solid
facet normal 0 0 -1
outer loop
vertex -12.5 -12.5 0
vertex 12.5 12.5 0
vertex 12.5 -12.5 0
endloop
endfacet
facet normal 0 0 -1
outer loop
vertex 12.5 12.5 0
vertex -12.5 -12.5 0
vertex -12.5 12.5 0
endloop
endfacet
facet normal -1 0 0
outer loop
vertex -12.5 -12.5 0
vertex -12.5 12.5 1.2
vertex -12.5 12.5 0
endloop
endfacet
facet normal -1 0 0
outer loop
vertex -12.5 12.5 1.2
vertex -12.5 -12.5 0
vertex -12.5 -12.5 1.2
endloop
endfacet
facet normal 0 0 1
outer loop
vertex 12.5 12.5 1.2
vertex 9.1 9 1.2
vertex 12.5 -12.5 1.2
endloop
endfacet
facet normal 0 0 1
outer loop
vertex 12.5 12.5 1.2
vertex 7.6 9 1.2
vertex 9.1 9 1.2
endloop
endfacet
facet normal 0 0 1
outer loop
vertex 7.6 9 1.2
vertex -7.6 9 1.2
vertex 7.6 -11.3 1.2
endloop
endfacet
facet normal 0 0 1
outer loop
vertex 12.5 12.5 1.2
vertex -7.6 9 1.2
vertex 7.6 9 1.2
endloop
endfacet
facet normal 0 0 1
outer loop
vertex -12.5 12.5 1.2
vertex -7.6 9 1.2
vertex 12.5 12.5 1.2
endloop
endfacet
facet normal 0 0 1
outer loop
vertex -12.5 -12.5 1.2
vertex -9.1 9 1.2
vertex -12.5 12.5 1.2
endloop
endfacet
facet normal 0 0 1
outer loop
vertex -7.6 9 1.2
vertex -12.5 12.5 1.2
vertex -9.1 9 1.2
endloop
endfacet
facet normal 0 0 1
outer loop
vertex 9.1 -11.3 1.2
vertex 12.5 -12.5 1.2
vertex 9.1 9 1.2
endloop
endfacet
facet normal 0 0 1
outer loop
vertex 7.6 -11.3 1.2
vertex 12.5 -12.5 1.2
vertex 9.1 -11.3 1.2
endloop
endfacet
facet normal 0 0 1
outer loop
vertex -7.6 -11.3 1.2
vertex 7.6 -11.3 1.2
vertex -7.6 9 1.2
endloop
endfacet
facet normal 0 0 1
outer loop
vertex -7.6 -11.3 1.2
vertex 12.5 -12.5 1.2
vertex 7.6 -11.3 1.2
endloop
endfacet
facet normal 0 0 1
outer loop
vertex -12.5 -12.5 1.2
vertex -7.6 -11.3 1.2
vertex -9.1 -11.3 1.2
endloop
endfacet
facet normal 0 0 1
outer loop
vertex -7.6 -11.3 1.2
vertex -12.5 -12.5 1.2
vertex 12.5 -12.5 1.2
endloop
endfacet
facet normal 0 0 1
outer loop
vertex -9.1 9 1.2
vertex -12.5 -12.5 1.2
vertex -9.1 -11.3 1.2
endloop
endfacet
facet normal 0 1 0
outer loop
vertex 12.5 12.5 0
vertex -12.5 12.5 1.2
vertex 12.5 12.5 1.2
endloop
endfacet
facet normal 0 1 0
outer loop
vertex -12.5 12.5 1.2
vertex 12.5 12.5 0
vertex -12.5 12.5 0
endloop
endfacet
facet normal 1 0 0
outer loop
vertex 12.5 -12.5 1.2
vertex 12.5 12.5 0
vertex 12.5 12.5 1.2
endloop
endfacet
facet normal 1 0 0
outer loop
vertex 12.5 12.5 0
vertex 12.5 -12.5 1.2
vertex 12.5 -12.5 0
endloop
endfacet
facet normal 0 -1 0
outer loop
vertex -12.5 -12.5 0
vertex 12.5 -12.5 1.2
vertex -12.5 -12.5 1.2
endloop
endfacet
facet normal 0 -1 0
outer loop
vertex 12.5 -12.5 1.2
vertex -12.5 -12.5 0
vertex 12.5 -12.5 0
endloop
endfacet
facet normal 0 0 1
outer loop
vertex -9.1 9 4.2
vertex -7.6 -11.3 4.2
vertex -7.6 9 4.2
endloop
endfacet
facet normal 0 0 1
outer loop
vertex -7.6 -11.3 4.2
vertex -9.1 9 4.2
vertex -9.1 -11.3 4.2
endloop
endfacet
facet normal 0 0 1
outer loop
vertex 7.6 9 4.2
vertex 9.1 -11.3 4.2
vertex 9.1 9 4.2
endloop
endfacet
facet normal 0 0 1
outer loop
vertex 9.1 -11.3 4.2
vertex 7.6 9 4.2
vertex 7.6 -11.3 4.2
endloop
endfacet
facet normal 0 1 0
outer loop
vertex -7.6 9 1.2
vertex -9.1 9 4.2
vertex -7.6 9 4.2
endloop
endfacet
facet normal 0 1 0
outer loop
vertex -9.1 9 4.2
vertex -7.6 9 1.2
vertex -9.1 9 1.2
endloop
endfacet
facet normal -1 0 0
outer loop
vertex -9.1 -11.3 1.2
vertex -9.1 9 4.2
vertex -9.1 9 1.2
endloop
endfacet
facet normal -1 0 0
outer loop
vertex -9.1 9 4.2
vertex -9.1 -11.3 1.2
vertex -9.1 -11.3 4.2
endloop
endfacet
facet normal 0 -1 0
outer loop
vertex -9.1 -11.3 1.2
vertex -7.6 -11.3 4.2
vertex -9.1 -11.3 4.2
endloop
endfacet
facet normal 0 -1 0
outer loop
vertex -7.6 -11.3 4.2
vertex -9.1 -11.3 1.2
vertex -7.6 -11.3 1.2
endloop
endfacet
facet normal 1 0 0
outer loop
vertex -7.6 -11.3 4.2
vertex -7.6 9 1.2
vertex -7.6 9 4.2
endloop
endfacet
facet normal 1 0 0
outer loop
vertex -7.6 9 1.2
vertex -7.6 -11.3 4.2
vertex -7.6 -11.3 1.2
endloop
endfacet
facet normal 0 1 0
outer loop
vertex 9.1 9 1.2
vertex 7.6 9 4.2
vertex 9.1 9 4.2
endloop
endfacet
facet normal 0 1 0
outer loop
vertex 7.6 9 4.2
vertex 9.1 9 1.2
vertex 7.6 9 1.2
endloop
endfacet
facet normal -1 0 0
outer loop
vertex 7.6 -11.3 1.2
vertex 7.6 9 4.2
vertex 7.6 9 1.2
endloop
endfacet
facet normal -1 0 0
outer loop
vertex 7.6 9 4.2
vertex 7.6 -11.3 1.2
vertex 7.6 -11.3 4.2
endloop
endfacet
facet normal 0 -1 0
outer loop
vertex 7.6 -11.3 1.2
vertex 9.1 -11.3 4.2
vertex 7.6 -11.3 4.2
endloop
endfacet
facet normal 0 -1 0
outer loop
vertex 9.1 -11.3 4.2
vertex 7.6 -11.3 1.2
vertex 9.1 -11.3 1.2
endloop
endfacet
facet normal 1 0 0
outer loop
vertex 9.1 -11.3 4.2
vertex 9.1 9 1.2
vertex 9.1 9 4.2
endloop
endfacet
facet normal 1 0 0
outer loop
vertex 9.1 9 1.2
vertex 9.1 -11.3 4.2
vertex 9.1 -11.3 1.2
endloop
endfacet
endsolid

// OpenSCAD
// ============================================================
// 모터 드라이버 쪽 면 - 평면도(XY, 정면에서 본 모습)
// 아래쪽 변이 ERM 면과 연결됨 (브라켓이 바로 아래쪽 하우징 테두리에 맞닿음).
// ============================================================

face_size = 25;   // 면의 가로/세로 (정사각형)
housing_t = 1.2;  // 하우징 두께 (사방 테두리)

gap_y     = 2.3;   // 위쪽 하우징 테두리 - 브라켓 사이 빈 공간
bracket_h = 20.3;  // 세로 브라켓(모터 드라이버 고정) 세로 높이
gap_x     = 2.2;   // 좌우 하우징 테두리 - 브라켓 사이 빈 공간
bracket_w = 1.5;   // 세로 브라켓(모터 드라이버 고정) 가로 두께
open_w    = 15.2;  // 브라켓 사이 뚫린 공간 가로 폭

bracket_z = 3;     // 모터 드라이버 고정 두께의 Z방향 깊이 (ERM 면 스택의 3mm 재사용)
guide_h   = 0.01;  // 참고용 2D 레이아웃 표시용 얇은 두께

frame_inner_w = face_size - 2 * housing_t; // 테두리 프레임 안쪽 폭 (22.6mm)

// Y축 (위 -> 아래)
y_top = face_size / 2;
y1 = y_top - housing_t;   // gap_y 상단
y2 = y1 - gap_y;          // 브라켓 상단
y3 = y2 - bracket_h;      // 브라켓 하단 = 아래쪽 하우징 테두리 상단 (ERM 연결)
y_bottom = y3 - housing_t; // 검증용 (-face_size/2 와 같아야 함)

// X축 (왼쪽 -> 오른쪽)
x_left = -face_size / 2;
x1 = x_left + housing_t;  // gap_x 오른쪽 끝
x2 = x1 + gap_x;          // 왼쪽 브라켓 오른쪽 끝
x3 = x2 + bracket_w;      // 뚫린 공간(open_w) 오른쪽 끝
x4 = x3 + open_w;         // 오른쪽 브라켓 왼쪽 끝
x5 = x4 + bracket_w;      // gap_x 오른쪽 끝
x_right_check = x5 + gap_x + housing_t; // 검증용 (face_size/2 와 같아야 함)

bracket_center_y = (y2 + y3) / 2;
left_bracket_center_x  = (x2 + x3) / 2;
right_bracket_center_x = (x4 + x5) / 2;

echo("y_bottom check =", y_bottom, " (should be", -face_size / 2, ")");
echo("x_right check =", x_right_check, " (should be", face_size / 2, ")");
echo("bracket centers: left =", left_bracket_center_x, " right =", right_bracket_center_x, " y =", bracket_center_y);

// --- 참고용 2D 레이아웃 ---
module face_reference_2d() {
    // 하우징 바닥판 (면 전체, 실제 3D, 두께 1.2mm)
    color("gray")
        linear_extrude(height = housing_t)
            square([face_size, face_size], center = true);
}

// --- 모터 드라이버 고정 브라켓 (실제 3D, 바닥판 위에 Z 깊이 3mm 추가) ---
module motor_driver_brackets() {
    color("purple")
        translate([0, 0, housing_t])
            linear_extrude(height = bracket_z) {
                translate([left_bracket_center_x, bracket_center_y])
                    square([bracket_w, bracket_h], center = true);
                translate([right_bracket_center_x, bracket_center_y])
                    square([bracket_w, bracket_h], center = true);
            }
}

face_reference_2d();
motor_driver_brackets();
